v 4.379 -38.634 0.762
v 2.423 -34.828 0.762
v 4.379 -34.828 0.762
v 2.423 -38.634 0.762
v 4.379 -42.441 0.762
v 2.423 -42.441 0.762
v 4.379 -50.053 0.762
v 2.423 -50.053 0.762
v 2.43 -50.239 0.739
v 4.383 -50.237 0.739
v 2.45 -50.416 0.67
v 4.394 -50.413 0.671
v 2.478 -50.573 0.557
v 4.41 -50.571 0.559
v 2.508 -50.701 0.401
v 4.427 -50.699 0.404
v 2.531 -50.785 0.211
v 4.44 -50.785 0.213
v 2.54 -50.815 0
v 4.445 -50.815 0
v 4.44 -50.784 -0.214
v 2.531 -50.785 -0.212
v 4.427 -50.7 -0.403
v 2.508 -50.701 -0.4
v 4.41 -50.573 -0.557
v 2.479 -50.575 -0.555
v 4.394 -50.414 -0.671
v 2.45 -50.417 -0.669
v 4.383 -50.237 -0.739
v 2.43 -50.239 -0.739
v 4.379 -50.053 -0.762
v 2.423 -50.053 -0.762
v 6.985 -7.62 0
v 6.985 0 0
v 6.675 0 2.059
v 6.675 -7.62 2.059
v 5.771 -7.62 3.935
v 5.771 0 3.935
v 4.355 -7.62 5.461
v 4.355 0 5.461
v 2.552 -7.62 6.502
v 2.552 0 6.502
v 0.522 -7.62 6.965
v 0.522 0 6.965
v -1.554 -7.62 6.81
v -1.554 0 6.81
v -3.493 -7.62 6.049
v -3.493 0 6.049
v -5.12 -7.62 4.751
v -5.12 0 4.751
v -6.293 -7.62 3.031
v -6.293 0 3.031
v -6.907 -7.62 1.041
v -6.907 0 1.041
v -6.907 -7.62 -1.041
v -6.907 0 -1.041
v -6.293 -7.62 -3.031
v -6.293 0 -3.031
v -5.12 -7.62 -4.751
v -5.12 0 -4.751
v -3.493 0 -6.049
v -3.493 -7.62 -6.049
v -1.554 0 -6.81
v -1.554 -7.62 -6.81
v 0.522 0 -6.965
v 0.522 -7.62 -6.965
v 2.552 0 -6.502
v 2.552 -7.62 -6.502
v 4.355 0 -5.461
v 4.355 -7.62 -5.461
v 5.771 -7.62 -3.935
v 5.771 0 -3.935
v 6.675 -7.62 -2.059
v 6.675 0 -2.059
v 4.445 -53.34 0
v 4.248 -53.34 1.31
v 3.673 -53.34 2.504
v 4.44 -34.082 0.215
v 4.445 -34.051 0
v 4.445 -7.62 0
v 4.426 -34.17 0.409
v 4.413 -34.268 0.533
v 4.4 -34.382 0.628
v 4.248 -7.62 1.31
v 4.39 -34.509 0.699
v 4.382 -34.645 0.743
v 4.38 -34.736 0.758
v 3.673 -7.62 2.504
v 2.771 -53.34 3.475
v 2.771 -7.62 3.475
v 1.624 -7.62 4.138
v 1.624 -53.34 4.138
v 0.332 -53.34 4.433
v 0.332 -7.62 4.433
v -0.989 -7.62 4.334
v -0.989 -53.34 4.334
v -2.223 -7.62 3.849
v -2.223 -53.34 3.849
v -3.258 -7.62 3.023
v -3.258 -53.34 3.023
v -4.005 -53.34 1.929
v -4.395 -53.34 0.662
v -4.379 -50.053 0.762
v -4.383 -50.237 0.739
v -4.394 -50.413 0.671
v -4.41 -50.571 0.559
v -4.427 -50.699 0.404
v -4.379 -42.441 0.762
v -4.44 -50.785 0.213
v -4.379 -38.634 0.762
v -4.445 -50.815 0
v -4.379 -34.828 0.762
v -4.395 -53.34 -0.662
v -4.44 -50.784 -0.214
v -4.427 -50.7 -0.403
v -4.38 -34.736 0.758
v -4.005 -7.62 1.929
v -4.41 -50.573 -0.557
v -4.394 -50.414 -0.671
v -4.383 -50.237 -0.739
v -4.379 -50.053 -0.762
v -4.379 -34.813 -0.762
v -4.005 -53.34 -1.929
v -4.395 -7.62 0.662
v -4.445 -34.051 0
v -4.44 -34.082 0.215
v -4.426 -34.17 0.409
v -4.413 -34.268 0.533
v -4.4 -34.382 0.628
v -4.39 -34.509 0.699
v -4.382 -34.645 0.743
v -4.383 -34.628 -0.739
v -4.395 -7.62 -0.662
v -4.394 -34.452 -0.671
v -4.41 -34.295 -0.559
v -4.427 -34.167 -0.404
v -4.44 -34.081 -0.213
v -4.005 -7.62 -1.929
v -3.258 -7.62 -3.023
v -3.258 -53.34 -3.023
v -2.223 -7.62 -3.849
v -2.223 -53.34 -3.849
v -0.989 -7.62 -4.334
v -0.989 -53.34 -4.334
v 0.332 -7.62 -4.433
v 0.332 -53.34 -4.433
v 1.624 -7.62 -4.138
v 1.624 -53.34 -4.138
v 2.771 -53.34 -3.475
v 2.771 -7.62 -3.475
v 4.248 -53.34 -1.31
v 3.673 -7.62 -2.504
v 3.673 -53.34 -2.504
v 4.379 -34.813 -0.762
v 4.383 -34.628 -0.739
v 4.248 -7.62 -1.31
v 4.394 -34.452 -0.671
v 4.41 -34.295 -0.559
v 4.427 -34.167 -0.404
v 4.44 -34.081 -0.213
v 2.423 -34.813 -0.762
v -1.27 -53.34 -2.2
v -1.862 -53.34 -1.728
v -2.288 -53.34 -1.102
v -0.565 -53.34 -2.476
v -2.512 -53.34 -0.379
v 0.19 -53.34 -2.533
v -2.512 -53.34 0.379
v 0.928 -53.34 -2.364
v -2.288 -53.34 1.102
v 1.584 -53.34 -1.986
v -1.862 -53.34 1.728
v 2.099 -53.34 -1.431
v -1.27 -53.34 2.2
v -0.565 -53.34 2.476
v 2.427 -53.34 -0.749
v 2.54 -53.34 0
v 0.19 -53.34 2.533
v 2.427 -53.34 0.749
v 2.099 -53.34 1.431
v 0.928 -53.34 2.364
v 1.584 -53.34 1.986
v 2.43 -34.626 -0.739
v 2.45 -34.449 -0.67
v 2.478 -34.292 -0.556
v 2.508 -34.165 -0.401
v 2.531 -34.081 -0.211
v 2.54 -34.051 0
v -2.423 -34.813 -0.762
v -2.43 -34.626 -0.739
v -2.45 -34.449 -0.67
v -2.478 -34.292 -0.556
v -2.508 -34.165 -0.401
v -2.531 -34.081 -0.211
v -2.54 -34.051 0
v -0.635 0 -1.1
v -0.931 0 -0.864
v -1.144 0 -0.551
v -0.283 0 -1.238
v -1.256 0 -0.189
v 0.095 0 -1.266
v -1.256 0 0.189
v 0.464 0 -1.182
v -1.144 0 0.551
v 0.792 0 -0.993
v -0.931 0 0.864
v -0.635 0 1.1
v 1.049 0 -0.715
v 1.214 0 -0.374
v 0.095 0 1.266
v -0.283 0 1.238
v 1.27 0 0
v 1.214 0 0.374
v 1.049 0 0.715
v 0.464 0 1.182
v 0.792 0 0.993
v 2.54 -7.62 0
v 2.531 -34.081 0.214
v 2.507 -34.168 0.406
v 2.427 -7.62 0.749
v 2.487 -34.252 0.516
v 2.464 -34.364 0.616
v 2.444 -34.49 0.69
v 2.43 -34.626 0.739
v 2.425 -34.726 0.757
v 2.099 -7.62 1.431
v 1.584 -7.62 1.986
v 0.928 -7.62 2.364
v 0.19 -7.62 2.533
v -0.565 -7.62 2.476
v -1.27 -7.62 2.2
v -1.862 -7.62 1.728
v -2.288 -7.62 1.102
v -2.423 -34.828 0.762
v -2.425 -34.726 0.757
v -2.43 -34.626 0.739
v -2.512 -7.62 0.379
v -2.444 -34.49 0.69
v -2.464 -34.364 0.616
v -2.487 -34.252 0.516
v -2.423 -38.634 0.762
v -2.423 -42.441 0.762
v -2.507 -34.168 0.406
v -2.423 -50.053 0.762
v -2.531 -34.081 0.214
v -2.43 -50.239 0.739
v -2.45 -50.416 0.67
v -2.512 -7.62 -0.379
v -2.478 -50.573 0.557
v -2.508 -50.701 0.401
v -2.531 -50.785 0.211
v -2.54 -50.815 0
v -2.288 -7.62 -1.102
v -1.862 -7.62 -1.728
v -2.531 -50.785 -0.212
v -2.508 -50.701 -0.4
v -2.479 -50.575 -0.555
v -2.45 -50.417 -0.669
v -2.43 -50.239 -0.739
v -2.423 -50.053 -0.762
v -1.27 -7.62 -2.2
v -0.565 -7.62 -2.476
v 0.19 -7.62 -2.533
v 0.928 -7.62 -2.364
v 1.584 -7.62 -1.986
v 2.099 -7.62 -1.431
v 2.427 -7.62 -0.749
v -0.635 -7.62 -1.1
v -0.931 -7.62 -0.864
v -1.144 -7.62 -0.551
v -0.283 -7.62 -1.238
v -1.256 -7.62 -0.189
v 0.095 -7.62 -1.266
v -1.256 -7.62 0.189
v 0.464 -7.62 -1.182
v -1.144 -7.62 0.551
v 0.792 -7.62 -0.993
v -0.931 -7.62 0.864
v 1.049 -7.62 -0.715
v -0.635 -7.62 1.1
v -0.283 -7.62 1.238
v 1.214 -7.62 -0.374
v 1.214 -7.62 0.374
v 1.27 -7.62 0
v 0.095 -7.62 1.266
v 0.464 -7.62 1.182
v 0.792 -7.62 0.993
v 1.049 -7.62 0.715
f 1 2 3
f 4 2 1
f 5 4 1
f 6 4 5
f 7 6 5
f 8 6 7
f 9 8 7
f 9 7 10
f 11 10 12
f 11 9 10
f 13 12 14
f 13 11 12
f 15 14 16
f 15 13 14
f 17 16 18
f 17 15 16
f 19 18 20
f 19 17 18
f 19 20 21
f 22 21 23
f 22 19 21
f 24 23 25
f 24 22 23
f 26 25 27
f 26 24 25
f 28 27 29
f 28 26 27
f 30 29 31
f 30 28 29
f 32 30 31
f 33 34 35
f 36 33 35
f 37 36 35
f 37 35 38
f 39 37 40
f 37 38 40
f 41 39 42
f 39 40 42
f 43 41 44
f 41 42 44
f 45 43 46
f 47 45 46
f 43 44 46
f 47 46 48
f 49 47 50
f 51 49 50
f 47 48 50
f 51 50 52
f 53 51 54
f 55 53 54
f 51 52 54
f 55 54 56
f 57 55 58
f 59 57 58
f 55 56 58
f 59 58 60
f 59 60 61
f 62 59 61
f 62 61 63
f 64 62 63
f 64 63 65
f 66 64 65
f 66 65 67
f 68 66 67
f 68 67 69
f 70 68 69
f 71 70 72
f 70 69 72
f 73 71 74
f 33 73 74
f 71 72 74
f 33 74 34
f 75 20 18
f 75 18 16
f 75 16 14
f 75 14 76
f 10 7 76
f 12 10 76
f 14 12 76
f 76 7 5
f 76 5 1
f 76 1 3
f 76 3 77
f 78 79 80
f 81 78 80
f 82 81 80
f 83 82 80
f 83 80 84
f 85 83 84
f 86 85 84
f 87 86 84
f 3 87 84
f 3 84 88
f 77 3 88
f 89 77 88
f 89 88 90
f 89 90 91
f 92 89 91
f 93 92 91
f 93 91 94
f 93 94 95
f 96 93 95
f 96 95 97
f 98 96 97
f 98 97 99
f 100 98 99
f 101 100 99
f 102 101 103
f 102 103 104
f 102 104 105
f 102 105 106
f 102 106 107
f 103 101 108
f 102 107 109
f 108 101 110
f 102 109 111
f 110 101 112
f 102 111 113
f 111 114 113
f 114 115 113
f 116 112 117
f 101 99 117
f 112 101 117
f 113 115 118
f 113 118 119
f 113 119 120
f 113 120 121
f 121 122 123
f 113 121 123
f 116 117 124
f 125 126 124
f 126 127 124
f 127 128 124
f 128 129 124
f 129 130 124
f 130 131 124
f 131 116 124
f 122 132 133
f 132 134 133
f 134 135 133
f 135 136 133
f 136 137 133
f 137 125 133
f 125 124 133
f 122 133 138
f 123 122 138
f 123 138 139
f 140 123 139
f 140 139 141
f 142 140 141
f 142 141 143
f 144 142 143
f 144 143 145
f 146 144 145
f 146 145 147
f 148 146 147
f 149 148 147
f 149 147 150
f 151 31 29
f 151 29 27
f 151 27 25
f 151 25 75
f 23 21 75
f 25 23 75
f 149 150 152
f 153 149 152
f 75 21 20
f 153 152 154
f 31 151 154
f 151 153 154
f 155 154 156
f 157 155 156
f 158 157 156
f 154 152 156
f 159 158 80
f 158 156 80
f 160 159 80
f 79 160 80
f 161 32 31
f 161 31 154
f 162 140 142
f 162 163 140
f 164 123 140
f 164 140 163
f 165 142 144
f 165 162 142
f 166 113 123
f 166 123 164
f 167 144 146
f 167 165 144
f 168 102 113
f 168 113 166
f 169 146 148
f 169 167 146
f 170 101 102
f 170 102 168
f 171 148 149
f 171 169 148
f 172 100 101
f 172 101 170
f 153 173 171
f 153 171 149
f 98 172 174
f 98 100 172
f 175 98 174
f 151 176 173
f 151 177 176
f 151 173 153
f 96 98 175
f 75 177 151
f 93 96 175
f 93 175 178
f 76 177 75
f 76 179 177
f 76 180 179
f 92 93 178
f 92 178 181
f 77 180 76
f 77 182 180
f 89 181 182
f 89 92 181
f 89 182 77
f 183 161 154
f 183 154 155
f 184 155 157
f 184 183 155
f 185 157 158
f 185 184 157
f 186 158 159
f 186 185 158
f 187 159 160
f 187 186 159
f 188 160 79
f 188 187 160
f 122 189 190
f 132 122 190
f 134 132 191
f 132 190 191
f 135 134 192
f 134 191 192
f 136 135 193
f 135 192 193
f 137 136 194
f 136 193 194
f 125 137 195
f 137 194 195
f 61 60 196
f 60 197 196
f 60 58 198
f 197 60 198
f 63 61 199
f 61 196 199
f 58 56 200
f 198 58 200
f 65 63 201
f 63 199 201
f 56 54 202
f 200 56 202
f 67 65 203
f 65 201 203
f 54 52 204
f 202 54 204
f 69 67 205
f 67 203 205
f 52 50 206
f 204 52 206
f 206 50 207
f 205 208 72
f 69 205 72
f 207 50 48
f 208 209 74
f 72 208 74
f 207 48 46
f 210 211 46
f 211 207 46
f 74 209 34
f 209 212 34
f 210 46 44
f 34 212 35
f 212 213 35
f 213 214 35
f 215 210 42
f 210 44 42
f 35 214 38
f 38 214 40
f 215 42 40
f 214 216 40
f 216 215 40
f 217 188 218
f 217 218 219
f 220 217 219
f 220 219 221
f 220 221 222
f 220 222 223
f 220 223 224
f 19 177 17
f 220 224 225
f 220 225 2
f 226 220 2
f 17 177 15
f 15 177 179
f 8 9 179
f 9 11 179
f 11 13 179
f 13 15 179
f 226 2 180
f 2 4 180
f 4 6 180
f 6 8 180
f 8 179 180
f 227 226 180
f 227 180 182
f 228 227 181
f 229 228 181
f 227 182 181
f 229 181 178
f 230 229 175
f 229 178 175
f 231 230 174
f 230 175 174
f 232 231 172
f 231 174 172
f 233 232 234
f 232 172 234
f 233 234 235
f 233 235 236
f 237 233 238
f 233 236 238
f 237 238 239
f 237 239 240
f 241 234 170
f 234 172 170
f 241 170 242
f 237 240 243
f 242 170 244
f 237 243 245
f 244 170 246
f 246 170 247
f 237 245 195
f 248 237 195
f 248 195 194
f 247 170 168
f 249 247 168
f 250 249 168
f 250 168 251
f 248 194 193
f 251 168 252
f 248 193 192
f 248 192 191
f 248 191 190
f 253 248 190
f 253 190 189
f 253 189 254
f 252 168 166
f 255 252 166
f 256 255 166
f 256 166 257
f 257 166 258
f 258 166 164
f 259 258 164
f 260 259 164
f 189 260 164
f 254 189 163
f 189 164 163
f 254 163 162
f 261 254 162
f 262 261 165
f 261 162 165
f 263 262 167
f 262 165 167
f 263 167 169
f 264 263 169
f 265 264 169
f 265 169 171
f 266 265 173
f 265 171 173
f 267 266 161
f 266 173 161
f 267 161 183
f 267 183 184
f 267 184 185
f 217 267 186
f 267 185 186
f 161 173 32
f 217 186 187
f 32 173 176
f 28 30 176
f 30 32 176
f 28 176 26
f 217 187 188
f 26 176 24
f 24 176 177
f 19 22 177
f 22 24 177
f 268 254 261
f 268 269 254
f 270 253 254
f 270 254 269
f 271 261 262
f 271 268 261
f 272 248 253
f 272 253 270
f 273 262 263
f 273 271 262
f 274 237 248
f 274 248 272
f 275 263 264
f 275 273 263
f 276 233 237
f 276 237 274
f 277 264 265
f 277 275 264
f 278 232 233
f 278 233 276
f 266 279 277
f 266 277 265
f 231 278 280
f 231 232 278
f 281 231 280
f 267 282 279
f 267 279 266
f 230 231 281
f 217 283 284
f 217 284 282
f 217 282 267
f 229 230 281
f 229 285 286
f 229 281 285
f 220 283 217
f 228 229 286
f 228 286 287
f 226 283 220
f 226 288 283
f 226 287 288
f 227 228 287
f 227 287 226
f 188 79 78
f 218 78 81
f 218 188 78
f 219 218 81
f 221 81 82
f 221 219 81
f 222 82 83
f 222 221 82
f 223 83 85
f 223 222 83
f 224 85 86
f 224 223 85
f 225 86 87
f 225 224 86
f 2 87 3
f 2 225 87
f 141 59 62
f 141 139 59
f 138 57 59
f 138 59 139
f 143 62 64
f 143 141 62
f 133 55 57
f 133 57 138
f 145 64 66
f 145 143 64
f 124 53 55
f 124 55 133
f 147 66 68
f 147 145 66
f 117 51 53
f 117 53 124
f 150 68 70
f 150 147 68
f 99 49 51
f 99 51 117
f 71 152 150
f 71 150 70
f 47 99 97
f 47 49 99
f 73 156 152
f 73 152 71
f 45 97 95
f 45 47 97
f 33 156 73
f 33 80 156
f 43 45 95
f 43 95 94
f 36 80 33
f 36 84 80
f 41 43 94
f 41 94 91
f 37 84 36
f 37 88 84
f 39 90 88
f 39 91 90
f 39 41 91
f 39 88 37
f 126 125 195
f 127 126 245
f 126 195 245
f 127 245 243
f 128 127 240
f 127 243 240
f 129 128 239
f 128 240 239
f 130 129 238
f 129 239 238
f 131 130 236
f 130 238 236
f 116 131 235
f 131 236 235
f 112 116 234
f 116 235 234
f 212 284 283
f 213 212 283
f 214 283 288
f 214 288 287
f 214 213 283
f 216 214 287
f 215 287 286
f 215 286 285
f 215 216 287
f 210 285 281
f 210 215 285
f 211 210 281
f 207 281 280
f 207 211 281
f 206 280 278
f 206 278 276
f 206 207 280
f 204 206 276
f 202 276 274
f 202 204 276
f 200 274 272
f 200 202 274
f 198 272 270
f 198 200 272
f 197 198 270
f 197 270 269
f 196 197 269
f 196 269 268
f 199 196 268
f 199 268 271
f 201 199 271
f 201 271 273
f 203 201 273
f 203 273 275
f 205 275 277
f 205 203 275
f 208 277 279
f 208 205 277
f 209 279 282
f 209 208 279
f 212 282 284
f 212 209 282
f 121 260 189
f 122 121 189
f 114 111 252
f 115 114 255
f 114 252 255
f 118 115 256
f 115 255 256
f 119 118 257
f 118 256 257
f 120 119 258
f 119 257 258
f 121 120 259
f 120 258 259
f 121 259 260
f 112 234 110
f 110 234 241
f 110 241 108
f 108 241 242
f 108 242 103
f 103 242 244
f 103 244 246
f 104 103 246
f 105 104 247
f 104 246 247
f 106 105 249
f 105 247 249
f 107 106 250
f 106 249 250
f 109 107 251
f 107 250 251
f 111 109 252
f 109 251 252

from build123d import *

# Parameters (mm, degrees)
F0_R     = 6.985
F0_R_2   = 1.27
F1_DEPTH = 7.62
F2_R     = 4.445
F2_R_2   = 1.27
F3_DEPTH = 45.72
F5_DEPTH = 25.4
F6_DEPTH = 25.4
F7_R     = 2.54
F7_R_2   = 1.27
F8_DEPTH = 20.32
F9_DEPTH = 25.4


with BuildPart() as f1:
    # F0 (on Front) → F1 (new body)
    with BuildSketch(Plane.XZ):
        Circle(F0_R)
        Circle(F0_R_2, mode=Mode.SUBTRACT)
    extrude(amount=F1_DEPTH)

    # F2 (on face) → F3 (join)
    with BuildSketch(Plane.XZ.offset(7.62)):
        Circle(F2_R)
        Circle(F2_R_2, mode=Mode.SUBTRACT)
    extrude(amount=F3_DEPTH)

    # F4 (on Right) → F5 (cut)
    with BuildSketch(Plane.YZ):
        with BuildLine():
            ThreePointArc((-50.0528407257, 0.762), (-50.5916560929, 0.5388153673), (-50.8148407257, 0))
            Line((-50.8148407257, 0), (-50.0528407257, 0))
            Line((-50.0528407257, 0), (-50.0528407257, 0.762))
        make_face()
        with BuildLine():
            Line((-50.0528407257, 0), (-50.8148407257, 0))
            ThreePointArc((-50.8148407257, 0), (-50.5916560929, -0.5388153673), (-50.0528407257, -0.762))
            Line((-50.0528407257, -0.762), (-50.0528407257, 0))
        make_face()
        with BuildLine():
            Line((-50.0528407257, 0.762), (-50.0528407257, 0))
            Line((-50.0528407257, 0), (-49.2908407257, 0))
            ThreePointArc((-49.2908407257, 0), (-49.5140253584, 0.5388153673), (-50.0528407257, 0.762))
        make_face()
        with BuildLine():
            Line((-49.2908407257, 0), (-50.0528407257, 0))
            Line((-50.0528407257, 0), (-50.0528407257, -0.762))
            ThreePointArc((-50.0528407257, -0.762), (-49.5140253584, -0.5388153673), (-49.2908407257, 0))
        make_face()
        with BuildLine():
            Line((-34.8282884293, 0.7618434015), (-50.0528407257, 0.762))
            ThreePointArc((-50.0528407257, 0.762), (-49.5140253584, 0.5388153673), (-49.2908407257, 0))
            Line((-49.2908407257, 0), (-35.5748407257, 0))
            ThreePointArc((-35.5748407257, 0), (-35.3570902779, 0.533325815), (-34.8282884293, 0.7618434015))
        make_face()
        with BuildLine():
            ThreePointArc((-49.2908407257, 0), (-49.5140253584, -0.5388153673), (-50.0528407257, -0.762))
            Line((-50.0528407257, -0.762), (-34.8128407257, -0.762))
            ThreePointArc((-34.8128407257, -0.762), (-35.3516560929, -0.5388153673), (-35.5748407257, 0))
            Line((-35.5748407257, 0), (-49.2908407257, 0))
        make_face()
        with BuildLine():
            ThreePointArc((-34.0508407257, 0), (-34.2795149107, 0.5442495522), (-34.8282884293, 0.7618434015))
            ThreePointArc((-34.8282884293, 0.7618434015), (-35.3570902779, 0.533325815), (-35.5748407257, 0))
            Line((-35.5748407257, 0), (-34.0508407257, 0))
        make_face()
        with BuildLine():
            ThreePointArc((-35.5748407257, 0), (-35.3516560929, -0.5388153673), (-34.8128407257, -0.762))
            ThreePointArc((-34.8128407257, -0.762), (-34.2740253584, -0.5388153673), (-34.0508407257, 0))
            Line((-34.0508407257, 0), (-35.5748407257, 0))
        make_face()
    extrude(amount=-F5_DEPTH, mode=Mode.SUBTRACT)

    # F4 (on Right) → F6 (cut)
    with BuildSketch(Plane.YZ):
        with BuildLine():
            ThreePointArc((-50.0528407257, 0.762), (-50.5916560929, 0.5388153673), (-50.8148407257, 0))
            Line((-50.8148407257, 0), (-50.0528407257, 0))
            Line((-50.0528407257, 0), (-50.0528407257, 0.762))
        make_face()
        with BuildLine():
            Line((-50.0528407257, 0), (-50.8148407257, 0))
            ThreePointArc((-50.8148407257, 0), (-50.5916560929, -0.5388153673), (-50.0528407257, -0.762))
            Line((-50.0528407257, -0.762), (-50.0528407257, 0))
        make_face()
        with BuildLine():
            Line((-50.0528407257, 0.762), (-50.0528407257, 0))
            Line((-50.0528407257, 0), (-49.2908407257, 0))
            ThreePointArc((-49.2908407257, 0), (-49.5140253584, 0.5388153673), (-50.0528407257, 0.762))
        make_face()
        with BuildLine():
            Line((-49.2908407257, 0), (-50.0528407257, 0))
            Line((-50.0528407257, 0), (-50.0528407257, -0.762))
            ThreePointArc((-50.0528407257, -0.762), (-49.5140253584, -0.5388153673), (-49.2908407257, 0))
        make_face()
        with BuildLine():
            Line((-34.8282884293, 0.7618434015), (-50.0528407257, 0.762))
            ThreePointArc((-50.0528407257, 0.762), (-49.5140253584, 0.5388153673), (-49.2908407257, 0))
            Line((-49.2908407257, 0), (-35.5748407257, 0))
            ThreePointArc((-35.5748407257, 0), (-35.3570902779, 0.533325815), (-34.8282884293, 0.7618434015))
        make_face()
        with BuildLine():
            ThreePointArc((-49.2908407257, 0), (-49.5140253584, -0.5388153673), (-50.0528407257, -0.762))
            Line((-50.0528407257, -0.762), (-34.8128407257, -0.762))
            ThreePointArc((-34.8128407257, -0.762), (-35.3516560929, -0.5388153673), (-35.5748407257, 0))
            Line((-35.5748407257, 0), (-49.2908407257, 0))
        make_face()
        with BuildLine():
            ThreePointArc((-34.0508407257, 0), (-34.2795149107, 0.5442495522), (-34.8282884293, 0.7618434015))
            ThreePointArc((-34.8282884293, 0.7618434015), (-35.3570902779, 0.533325815), (-35.5748407257, 0))
            Line((-35.5748407257, 0), (-34.0508407257, 0))
        make_face()
        with BuildLine():
            ThreePointArc((-35.5748407257, 0), (-35.3516560929, -0.5388153673), (-34.8128407257, -0.762))
            ThreePointArc((-34.8128407257, -0.762), (-34.2740253584, -0.5388153673), (-34.0508407257, 0))
            Line((-34.0508407257, 0), (-35.5748407257, 0))
        make_face()
    extrude(amount=F6_DEPTH, mode=Mode.SUBTRACT)

    # F7 (on face) → F8 (cut)
    with BuildSketch(Plane.XZ.offset(53.34)):
        Circle(F7_R)
        Circle(F7_R_2, mode=Mode.SUBTRACT)
    extrude(amount=-F8_DEPTH, mode=Mode.SUBTRACT)

    # F9 (cut): a face of the model
    f9_faces = [f1.faces().sort_by_distance(p)[0] for p in [
        (-2.468157951, -33.02, 0),
    ]]
    extrude(f9_faces, amount=-F9_DEPTH, mode=Mode.SUBTRACT)


solid = f1.part
